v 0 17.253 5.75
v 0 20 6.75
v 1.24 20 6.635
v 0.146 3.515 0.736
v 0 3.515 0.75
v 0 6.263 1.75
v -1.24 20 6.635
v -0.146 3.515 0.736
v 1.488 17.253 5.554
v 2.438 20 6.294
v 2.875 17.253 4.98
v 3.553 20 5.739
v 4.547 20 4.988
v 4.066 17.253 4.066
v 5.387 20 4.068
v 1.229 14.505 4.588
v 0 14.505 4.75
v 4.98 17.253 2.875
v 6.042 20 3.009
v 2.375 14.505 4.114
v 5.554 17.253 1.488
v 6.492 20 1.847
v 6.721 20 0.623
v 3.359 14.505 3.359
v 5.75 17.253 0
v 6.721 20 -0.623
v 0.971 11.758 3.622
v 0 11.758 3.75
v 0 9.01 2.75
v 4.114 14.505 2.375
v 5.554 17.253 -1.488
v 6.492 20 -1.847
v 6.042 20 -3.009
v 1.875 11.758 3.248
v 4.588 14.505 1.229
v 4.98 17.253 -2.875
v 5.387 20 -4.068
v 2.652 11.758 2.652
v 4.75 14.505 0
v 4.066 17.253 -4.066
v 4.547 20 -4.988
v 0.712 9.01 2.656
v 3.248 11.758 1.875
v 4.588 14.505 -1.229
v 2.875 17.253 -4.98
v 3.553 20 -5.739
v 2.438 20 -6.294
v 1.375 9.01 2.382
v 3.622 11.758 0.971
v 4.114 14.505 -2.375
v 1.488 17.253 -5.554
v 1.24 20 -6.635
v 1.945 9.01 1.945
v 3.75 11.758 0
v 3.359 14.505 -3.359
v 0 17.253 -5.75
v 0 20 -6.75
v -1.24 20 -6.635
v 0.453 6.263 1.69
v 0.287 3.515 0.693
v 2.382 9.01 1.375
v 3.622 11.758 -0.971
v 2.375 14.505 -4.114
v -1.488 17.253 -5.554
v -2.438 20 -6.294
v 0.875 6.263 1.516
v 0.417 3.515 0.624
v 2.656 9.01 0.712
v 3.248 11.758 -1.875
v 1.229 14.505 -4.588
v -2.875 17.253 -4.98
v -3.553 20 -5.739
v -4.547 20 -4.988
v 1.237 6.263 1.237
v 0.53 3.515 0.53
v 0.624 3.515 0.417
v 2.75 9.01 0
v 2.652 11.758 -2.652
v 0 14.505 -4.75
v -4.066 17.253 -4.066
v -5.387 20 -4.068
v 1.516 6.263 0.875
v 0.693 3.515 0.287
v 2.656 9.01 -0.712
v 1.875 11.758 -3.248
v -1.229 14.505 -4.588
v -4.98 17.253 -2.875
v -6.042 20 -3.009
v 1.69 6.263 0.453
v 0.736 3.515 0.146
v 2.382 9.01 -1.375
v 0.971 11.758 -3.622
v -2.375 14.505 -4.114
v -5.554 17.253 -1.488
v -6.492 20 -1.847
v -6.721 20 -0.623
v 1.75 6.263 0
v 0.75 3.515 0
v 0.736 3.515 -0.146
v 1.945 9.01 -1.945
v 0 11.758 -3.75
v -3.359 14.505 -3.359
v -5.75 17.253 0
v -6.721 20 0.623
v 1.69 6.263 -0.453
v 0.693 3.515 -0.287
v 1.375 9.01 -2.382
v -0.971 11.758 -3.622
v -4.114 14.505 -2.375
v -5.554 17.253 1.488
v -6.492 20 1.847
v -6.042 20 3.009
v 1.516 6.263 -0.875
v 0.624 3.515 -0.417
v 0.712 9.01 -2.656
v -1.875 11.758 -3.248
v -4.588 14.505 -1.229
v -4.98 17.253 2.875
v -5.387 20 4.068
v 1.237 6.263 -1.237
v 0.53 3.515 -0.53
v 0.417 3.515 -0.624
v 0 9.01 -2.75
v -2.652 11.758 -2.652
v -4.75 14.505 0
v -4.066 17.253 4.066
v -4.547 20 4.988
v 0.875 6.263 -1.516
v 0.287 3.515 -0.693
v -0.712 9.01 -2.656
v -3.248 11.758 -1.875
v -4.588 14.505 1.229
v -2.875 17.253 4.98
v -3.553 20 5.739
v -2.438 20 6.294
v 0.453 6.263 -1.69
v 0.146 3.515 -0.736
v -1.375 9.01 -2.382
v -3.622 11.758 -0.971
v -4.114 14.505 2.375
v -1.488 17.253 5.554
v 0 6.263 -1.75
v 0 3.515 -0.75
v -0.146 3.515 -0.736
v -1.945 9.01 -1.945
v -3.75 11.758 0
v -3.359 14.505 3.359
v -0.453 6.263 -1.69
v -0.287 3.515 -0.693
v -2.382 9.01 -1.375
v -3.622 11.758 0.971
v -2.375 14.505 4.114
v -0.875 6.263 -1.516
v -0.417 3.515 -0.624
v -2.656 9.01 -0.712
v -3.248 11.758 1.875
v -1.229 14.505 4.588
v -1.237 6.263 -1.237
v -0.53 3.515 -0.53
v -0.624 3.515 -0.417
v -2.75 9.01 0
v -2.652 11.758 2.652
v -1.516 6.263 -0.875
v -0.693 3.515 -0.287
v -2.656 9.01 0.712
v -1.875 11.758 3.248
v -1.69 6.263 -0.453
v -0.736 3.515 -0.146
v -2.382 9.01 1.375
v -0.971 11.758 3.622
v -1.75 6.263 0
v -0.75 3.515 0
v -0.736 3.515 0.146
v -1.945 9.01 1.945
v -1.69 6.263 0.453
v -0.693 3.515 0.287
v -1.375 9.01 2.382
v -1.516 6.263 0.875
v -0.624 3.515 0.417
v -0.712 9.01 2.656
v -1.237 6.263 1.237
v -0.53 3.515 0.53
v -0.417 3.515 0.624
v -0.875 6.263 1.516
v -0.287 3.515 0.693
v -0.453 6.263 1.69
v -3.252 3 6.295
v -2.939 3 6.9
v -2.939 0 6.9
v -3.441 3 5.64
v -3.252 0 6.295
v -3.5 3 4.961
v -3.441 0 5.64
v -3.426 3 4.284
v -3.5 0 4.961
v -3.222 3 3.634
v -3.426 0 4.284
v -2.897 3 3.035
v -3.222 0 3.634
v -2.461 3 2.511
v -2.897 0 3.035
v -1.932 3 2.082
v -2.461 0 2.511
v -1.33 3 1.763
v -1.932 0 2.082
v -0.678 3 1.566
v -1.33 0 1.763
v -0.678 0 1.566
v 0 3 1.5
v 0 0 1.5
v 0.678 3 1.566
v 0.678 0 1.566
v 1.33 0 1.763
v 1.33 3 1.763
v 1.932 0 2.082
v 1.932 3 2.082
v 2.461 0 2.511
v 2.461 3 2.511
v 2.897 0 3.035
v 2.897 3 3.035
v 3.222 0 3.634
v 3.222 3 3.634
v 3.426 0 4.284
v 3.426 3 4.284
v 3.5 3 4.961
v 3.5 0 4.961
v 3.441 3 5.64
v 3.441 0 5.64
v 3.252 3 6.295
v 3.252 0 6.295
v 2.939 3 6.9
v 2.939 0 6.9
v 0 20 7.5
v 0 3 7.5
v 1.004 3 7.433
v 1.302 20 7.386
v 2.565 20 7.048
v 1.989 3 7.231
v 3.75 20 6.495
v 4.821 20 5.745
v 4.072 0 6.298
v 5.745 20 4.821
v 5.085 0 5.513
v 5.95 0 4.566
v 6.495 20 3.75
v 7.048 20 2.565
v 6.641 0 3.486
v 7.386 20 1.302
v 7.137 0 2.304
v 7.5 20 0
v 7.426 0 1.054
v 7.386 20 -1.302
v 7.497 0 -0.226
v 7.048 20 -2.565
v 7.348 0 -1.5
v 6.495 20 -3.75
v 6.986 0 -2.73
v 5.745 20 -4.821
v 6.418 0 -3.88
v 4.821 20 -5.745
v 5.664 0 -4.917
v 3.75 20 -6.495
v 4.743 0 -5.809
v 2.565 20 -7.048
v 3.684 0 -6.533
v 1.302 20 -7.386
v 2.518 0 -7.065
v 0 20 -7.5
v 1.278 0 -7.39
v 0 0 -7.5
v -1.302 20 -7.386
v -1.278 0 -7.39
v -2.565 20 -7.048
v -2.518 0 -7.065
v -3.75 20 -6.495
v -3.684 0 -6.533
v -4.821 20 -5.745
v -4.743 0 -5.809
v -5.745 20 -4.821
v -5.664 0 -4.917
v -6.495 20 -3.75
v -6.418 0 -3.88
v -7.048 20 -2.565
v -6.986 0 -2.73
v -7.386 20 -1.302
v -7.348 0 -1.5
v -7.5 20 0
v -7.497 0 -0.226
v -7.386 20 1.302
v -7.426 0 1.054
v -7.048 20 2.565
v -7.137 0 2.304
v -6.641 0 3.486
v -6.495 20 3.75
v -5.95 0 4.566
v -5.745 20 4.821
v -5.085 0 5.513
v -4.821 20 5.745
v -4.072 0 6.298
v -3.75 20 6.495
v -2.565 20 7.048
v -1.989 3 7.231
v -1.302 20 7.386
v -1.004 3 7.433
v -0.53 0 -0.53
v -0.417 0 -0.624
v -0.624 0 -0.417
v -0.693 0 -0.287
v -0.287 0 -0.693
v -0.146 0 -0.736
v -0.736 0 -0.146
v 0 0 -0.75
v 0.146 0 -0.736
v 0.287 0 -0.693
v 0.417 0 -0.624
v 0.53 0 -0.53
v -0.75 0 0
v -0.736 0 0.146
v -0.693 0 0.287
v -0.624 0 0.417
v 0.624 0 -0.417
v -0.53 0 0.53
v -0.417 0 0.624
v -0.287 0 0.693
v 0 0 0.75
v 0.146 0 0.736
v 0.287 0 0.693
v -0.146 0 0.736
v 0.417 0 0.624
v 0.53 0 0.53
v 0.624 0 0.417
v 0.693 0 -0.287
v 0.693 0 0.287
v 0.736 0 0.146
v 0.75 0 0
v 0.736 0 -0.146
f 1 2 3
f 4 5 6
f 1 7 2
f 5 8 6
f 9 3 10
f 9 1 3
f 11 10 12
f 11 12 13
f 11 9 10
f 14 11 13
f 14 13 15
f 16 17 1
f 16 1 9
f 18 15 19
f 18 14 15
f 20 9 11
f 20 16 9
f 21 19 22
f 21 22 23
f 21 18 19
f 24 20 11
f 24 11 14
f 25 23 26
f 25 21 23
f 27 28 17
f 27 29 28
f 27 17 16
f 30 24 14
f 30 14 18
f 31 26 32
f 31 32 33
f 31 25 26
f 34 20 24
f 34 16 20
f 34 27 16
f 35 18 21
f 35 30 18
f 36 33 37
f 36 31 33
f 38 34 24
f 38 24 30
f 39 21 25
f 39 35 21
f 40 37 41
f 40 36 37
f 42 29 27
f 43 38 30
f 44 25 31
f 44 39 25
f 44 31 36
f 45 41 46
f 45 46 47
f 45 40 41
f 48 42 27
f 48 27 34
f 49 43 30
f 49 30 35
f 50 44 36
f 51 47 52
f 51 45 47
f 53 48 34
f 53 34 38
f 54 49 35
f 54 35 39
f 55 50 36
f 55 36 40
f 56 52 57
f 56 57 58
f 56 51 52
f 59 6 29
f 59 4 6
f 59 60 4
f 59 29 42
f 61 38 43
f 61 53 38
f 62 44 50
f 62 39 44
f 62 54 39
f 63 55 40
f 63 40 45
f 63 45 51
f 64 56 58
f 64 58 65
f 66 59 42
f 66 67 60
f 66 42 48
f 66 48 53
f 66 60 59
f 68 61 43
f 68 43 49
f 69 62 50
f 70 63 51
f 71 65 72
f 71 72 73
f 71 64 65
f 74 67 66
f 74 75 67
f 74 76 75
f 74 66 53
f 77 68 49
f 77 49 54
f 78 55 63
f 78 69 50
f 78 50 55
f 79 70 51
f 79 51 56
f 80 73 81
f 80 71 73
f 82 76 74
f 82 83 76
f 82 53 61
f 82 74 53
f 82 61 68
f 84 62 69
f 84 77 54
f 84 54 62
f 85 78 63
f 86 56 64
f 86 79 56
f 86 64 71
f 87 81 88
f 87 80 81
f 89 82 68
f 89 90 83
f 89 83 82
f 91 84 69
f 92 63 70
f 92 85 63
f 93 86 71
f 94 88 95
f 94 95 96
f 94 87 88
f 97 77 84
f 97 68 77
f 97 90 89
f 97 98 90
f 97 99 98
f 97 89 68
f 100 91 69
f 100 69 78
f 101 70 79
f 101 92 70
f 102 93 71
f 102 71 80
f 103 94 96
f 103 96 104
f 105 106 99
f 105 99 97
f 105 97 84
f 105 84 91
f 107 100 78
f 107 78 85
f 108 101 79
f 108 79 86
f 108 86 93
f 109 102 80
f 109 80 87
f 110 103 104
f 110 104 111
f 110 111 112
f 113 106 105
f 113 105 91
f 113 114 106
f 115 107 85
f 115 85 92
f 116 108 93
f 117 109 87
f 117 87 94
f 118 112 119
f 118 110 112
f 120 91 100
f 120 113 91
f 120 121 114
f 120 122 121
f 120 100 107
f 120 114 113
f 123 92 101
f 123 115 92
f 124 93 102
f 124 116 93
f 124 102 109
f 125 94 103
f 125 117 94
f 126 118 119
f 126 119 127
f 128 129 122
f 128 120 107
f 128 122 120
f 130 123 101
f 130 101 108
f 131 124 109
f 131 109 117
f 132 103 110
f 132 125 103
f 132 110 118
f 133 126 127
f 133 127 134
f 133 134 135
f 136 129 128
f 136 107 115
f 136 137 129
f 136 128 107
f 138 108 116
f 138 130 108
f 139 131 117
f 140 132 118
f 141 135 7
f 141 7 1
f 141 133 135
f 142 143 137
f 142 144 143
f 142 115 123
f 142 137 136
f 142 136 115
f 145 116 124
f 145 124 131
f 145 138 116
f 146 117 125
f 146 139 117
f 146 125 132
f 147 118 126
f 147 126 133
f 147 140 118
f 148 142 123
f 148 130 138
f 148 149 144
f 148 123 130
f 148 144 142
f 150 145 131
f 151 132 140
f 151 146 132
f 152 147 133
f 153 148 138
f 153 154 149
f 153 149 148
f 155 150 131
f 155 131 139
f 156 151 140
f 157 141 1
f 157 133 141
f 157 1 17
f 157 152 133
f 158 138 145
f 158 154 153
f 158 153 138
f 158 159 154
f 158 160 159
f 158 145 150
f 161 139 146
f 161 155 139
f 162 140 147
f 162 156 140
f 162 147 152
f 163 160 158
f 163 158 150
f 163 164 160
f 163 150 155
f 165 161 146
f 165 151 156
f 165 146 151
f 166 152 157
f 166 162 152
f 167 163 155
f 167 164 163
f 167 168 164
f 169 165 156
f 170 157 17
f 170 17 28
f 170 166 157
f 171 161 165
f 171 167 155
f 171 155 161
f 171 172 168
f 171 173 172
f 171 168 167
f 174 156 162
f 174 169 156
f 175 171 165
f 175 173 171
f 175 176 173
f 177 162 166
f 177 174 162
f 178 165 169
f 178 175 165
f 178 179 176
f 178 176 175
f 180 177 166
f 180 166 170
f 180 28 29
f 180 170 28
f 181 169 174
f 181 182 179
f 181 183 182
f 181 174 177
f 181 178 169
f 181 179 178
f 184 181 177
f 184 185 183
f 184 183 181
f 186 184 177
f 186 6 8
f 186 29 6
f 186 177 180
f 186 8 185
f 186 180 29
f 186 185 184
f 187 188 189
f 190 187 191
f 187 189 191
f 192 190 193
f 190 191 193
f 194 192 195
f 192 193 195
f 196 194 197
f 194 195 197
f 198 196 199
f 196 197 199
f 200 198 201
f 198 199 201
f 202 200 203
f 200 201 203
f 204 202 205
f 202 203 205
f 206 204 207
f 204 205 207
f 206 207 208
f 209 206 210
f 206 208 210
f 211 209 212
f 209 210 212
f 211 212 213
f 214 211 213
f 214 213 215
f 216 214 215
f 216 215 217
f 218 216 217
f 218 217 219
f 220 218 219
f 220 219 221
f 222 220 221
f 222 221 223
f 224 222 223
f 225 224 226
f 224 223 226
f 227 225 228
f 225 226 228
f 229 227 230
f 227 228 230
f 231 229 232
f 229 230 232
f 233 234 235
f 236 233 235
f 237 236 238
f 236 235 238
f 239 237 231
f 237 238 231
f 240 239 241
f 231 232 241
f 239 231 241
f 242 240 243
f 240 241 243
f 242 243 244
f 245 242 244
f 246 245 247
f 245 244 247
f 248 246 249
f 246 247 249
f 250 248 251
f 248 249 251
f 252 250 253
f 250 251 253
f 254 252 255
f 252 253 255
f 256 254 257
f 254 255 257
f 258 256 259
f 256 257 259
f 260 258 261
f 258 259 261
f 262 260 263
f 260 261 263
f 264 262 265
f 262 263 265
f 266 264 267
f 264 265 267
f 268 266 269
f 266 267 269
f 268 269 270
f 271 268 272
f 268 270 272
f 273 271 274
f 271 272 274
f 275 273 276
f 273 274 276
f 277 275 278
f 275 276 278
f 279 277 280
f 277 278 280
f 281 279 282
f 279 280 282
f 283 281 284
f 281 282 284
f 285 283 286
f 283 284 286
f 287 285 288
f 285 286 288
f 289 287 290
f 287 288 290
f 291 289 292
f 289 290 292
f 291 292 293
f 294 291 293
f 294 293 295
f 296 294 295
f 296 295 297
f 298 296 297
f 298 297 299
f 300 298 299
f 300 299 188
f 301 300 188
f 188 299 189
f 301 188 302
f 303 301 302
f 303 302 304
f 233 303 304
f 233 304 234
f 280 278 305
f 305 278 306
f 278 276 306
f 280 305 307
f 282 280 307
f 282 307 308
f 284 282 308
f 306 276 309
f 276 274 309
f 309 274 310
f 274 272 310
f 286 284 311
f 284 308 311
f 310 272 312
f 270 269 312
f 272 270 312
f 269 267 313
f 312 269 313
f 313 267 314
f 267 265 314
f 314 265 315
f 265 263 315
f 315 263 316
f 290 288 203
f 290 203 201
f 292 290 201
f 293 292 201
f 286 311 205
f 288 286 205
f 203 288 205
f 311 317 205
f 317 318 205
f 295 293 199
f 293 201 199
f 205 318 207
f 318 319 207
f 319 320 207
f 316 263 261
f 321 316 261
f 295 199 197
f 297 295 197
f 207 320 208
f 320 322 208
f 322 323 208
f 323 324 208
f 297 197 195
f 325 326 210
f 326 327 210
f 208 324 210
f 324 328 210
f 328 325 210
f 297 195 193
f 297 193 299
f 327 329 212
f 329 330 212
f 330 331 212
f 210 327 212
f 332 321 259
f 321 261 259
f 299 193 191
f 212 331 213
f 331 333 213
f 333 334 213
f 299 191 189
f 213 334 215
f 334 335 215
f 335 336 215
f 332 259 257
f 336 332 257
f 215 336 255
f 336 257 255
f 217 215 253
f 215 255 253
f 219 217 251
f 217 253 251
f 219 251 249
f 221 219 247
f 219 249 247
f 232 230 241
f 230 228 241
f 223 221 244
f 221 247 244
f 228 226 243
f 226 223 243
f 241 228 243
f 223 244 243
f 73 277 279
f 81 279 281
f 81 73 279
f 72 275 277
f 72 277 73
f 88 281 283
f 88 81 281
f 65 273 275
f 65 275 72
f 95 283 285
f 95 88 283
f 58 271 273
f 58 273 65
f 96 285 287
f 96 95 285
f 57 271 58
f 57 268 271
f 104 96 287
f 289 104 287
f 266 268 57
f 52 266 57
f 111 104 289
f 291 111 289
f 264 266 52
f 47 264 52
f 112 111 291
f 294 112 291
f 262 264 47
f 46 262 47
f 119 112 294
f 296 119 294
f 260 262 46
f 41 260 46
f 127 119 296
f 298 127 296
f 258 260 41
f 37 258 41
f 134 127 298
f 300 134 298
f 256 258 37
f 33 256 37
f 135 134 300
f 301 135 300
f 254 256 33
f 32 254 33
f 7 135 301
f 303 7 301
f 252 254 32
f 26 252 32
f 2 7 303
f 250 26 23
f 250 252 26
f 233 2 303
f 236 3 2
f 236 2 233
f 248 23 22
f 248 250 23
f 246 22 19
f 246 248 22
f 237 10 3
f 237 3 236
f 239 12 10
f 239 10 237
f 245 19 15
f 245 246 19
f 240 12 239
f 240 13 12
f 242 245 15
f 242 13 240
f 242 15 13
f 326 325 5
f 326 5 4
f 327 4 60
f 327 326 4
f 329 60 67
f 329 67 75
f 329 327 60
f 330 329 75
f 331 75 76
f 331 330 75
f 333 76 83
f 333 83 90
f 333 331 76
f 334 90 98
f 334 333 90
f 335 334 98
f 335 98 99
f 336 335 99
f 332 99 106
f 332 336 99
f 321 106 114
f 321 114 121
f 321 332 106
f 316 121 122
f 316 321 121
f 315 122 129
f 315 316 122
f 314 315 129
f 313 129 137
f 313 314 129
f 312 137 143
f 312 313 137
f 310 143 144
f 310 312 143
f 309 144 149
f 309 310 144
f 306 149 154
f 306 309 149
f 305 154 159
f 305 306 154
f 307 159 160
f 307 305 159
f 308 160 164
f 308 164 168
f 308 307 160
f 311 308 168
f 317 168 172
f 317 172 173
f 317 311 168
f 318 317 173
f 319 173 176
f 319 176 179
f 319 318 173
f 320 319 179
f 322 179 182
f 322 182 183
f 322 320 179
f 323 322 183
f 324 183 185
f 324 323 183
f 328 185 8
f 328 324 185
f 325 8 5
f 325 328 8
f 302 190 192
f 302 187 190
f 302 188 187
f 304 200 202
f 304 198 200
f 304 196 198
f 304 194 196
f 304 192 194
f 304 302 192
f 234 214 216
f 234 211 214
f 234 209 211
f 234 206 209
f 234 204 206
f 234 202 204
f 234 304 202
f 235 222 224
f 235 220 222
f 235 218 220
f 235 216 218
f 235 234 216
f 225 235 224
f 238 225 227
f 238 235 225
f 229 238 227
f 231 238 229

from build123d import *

# Parameters (mm, degrees)
SKETCH1_R           = 7.5
SKETCH1_R_2         = 0.75
BOSS_EXTRUDE1_DEPTH = 20
CHAMFER1_SIZE       = 6
CHAMFER1_SIZE2      = 16.484864517
SKETCH2_R           = 3.5
CUT_EXTRUDE1_DEPTH  = 3


with BuildPart() as part:
    # Sketch1 → Boss-Extrude1 (new body)
    with BuildSketch(Plane(origin=(0, 0, 0), x_dir=(1, 0, 0), z_dir=(0, 1, 0))):
        with Locations(Location((0, 0, 0), (0, 0, 270))):
            Circle(SKETCH1_R)
        with Locations(Location((0, 0, 0), (0, 0, 270))):
            Circle(SKETCH1_R_2, mode=Mode.SUBTRACT)
    extrude(amount=BOSS_EXTRUDE1_DEPTH)

    # Chamfer1
    chamfer1_edges = [part.edges().sort_by_distance(p)[0] for p in [
        (0, 20, -0.75),
    ]]
    chamfer1_side = [part.faces().sort_by_distance(p)[0] for p in [
        (0, 20, -7.287867966),
    ]]
    chamfer(chamfer1_edges, length=CHAMFER1_SIZE, length2=CHAMFER1_SIZE2, reference=chamfer1_side[0])

    # Sketch2 → Cut-Extrude1 (cut)
    with BuildSketch(Plane.XZ):
        with Locations((0, 5)):
            Circle(SKETCH2_R)
    extrude(amount=-CUT_EXTRUDE1_DEPTH, mode=Mode.SUBTRACT)


solid = part.part
